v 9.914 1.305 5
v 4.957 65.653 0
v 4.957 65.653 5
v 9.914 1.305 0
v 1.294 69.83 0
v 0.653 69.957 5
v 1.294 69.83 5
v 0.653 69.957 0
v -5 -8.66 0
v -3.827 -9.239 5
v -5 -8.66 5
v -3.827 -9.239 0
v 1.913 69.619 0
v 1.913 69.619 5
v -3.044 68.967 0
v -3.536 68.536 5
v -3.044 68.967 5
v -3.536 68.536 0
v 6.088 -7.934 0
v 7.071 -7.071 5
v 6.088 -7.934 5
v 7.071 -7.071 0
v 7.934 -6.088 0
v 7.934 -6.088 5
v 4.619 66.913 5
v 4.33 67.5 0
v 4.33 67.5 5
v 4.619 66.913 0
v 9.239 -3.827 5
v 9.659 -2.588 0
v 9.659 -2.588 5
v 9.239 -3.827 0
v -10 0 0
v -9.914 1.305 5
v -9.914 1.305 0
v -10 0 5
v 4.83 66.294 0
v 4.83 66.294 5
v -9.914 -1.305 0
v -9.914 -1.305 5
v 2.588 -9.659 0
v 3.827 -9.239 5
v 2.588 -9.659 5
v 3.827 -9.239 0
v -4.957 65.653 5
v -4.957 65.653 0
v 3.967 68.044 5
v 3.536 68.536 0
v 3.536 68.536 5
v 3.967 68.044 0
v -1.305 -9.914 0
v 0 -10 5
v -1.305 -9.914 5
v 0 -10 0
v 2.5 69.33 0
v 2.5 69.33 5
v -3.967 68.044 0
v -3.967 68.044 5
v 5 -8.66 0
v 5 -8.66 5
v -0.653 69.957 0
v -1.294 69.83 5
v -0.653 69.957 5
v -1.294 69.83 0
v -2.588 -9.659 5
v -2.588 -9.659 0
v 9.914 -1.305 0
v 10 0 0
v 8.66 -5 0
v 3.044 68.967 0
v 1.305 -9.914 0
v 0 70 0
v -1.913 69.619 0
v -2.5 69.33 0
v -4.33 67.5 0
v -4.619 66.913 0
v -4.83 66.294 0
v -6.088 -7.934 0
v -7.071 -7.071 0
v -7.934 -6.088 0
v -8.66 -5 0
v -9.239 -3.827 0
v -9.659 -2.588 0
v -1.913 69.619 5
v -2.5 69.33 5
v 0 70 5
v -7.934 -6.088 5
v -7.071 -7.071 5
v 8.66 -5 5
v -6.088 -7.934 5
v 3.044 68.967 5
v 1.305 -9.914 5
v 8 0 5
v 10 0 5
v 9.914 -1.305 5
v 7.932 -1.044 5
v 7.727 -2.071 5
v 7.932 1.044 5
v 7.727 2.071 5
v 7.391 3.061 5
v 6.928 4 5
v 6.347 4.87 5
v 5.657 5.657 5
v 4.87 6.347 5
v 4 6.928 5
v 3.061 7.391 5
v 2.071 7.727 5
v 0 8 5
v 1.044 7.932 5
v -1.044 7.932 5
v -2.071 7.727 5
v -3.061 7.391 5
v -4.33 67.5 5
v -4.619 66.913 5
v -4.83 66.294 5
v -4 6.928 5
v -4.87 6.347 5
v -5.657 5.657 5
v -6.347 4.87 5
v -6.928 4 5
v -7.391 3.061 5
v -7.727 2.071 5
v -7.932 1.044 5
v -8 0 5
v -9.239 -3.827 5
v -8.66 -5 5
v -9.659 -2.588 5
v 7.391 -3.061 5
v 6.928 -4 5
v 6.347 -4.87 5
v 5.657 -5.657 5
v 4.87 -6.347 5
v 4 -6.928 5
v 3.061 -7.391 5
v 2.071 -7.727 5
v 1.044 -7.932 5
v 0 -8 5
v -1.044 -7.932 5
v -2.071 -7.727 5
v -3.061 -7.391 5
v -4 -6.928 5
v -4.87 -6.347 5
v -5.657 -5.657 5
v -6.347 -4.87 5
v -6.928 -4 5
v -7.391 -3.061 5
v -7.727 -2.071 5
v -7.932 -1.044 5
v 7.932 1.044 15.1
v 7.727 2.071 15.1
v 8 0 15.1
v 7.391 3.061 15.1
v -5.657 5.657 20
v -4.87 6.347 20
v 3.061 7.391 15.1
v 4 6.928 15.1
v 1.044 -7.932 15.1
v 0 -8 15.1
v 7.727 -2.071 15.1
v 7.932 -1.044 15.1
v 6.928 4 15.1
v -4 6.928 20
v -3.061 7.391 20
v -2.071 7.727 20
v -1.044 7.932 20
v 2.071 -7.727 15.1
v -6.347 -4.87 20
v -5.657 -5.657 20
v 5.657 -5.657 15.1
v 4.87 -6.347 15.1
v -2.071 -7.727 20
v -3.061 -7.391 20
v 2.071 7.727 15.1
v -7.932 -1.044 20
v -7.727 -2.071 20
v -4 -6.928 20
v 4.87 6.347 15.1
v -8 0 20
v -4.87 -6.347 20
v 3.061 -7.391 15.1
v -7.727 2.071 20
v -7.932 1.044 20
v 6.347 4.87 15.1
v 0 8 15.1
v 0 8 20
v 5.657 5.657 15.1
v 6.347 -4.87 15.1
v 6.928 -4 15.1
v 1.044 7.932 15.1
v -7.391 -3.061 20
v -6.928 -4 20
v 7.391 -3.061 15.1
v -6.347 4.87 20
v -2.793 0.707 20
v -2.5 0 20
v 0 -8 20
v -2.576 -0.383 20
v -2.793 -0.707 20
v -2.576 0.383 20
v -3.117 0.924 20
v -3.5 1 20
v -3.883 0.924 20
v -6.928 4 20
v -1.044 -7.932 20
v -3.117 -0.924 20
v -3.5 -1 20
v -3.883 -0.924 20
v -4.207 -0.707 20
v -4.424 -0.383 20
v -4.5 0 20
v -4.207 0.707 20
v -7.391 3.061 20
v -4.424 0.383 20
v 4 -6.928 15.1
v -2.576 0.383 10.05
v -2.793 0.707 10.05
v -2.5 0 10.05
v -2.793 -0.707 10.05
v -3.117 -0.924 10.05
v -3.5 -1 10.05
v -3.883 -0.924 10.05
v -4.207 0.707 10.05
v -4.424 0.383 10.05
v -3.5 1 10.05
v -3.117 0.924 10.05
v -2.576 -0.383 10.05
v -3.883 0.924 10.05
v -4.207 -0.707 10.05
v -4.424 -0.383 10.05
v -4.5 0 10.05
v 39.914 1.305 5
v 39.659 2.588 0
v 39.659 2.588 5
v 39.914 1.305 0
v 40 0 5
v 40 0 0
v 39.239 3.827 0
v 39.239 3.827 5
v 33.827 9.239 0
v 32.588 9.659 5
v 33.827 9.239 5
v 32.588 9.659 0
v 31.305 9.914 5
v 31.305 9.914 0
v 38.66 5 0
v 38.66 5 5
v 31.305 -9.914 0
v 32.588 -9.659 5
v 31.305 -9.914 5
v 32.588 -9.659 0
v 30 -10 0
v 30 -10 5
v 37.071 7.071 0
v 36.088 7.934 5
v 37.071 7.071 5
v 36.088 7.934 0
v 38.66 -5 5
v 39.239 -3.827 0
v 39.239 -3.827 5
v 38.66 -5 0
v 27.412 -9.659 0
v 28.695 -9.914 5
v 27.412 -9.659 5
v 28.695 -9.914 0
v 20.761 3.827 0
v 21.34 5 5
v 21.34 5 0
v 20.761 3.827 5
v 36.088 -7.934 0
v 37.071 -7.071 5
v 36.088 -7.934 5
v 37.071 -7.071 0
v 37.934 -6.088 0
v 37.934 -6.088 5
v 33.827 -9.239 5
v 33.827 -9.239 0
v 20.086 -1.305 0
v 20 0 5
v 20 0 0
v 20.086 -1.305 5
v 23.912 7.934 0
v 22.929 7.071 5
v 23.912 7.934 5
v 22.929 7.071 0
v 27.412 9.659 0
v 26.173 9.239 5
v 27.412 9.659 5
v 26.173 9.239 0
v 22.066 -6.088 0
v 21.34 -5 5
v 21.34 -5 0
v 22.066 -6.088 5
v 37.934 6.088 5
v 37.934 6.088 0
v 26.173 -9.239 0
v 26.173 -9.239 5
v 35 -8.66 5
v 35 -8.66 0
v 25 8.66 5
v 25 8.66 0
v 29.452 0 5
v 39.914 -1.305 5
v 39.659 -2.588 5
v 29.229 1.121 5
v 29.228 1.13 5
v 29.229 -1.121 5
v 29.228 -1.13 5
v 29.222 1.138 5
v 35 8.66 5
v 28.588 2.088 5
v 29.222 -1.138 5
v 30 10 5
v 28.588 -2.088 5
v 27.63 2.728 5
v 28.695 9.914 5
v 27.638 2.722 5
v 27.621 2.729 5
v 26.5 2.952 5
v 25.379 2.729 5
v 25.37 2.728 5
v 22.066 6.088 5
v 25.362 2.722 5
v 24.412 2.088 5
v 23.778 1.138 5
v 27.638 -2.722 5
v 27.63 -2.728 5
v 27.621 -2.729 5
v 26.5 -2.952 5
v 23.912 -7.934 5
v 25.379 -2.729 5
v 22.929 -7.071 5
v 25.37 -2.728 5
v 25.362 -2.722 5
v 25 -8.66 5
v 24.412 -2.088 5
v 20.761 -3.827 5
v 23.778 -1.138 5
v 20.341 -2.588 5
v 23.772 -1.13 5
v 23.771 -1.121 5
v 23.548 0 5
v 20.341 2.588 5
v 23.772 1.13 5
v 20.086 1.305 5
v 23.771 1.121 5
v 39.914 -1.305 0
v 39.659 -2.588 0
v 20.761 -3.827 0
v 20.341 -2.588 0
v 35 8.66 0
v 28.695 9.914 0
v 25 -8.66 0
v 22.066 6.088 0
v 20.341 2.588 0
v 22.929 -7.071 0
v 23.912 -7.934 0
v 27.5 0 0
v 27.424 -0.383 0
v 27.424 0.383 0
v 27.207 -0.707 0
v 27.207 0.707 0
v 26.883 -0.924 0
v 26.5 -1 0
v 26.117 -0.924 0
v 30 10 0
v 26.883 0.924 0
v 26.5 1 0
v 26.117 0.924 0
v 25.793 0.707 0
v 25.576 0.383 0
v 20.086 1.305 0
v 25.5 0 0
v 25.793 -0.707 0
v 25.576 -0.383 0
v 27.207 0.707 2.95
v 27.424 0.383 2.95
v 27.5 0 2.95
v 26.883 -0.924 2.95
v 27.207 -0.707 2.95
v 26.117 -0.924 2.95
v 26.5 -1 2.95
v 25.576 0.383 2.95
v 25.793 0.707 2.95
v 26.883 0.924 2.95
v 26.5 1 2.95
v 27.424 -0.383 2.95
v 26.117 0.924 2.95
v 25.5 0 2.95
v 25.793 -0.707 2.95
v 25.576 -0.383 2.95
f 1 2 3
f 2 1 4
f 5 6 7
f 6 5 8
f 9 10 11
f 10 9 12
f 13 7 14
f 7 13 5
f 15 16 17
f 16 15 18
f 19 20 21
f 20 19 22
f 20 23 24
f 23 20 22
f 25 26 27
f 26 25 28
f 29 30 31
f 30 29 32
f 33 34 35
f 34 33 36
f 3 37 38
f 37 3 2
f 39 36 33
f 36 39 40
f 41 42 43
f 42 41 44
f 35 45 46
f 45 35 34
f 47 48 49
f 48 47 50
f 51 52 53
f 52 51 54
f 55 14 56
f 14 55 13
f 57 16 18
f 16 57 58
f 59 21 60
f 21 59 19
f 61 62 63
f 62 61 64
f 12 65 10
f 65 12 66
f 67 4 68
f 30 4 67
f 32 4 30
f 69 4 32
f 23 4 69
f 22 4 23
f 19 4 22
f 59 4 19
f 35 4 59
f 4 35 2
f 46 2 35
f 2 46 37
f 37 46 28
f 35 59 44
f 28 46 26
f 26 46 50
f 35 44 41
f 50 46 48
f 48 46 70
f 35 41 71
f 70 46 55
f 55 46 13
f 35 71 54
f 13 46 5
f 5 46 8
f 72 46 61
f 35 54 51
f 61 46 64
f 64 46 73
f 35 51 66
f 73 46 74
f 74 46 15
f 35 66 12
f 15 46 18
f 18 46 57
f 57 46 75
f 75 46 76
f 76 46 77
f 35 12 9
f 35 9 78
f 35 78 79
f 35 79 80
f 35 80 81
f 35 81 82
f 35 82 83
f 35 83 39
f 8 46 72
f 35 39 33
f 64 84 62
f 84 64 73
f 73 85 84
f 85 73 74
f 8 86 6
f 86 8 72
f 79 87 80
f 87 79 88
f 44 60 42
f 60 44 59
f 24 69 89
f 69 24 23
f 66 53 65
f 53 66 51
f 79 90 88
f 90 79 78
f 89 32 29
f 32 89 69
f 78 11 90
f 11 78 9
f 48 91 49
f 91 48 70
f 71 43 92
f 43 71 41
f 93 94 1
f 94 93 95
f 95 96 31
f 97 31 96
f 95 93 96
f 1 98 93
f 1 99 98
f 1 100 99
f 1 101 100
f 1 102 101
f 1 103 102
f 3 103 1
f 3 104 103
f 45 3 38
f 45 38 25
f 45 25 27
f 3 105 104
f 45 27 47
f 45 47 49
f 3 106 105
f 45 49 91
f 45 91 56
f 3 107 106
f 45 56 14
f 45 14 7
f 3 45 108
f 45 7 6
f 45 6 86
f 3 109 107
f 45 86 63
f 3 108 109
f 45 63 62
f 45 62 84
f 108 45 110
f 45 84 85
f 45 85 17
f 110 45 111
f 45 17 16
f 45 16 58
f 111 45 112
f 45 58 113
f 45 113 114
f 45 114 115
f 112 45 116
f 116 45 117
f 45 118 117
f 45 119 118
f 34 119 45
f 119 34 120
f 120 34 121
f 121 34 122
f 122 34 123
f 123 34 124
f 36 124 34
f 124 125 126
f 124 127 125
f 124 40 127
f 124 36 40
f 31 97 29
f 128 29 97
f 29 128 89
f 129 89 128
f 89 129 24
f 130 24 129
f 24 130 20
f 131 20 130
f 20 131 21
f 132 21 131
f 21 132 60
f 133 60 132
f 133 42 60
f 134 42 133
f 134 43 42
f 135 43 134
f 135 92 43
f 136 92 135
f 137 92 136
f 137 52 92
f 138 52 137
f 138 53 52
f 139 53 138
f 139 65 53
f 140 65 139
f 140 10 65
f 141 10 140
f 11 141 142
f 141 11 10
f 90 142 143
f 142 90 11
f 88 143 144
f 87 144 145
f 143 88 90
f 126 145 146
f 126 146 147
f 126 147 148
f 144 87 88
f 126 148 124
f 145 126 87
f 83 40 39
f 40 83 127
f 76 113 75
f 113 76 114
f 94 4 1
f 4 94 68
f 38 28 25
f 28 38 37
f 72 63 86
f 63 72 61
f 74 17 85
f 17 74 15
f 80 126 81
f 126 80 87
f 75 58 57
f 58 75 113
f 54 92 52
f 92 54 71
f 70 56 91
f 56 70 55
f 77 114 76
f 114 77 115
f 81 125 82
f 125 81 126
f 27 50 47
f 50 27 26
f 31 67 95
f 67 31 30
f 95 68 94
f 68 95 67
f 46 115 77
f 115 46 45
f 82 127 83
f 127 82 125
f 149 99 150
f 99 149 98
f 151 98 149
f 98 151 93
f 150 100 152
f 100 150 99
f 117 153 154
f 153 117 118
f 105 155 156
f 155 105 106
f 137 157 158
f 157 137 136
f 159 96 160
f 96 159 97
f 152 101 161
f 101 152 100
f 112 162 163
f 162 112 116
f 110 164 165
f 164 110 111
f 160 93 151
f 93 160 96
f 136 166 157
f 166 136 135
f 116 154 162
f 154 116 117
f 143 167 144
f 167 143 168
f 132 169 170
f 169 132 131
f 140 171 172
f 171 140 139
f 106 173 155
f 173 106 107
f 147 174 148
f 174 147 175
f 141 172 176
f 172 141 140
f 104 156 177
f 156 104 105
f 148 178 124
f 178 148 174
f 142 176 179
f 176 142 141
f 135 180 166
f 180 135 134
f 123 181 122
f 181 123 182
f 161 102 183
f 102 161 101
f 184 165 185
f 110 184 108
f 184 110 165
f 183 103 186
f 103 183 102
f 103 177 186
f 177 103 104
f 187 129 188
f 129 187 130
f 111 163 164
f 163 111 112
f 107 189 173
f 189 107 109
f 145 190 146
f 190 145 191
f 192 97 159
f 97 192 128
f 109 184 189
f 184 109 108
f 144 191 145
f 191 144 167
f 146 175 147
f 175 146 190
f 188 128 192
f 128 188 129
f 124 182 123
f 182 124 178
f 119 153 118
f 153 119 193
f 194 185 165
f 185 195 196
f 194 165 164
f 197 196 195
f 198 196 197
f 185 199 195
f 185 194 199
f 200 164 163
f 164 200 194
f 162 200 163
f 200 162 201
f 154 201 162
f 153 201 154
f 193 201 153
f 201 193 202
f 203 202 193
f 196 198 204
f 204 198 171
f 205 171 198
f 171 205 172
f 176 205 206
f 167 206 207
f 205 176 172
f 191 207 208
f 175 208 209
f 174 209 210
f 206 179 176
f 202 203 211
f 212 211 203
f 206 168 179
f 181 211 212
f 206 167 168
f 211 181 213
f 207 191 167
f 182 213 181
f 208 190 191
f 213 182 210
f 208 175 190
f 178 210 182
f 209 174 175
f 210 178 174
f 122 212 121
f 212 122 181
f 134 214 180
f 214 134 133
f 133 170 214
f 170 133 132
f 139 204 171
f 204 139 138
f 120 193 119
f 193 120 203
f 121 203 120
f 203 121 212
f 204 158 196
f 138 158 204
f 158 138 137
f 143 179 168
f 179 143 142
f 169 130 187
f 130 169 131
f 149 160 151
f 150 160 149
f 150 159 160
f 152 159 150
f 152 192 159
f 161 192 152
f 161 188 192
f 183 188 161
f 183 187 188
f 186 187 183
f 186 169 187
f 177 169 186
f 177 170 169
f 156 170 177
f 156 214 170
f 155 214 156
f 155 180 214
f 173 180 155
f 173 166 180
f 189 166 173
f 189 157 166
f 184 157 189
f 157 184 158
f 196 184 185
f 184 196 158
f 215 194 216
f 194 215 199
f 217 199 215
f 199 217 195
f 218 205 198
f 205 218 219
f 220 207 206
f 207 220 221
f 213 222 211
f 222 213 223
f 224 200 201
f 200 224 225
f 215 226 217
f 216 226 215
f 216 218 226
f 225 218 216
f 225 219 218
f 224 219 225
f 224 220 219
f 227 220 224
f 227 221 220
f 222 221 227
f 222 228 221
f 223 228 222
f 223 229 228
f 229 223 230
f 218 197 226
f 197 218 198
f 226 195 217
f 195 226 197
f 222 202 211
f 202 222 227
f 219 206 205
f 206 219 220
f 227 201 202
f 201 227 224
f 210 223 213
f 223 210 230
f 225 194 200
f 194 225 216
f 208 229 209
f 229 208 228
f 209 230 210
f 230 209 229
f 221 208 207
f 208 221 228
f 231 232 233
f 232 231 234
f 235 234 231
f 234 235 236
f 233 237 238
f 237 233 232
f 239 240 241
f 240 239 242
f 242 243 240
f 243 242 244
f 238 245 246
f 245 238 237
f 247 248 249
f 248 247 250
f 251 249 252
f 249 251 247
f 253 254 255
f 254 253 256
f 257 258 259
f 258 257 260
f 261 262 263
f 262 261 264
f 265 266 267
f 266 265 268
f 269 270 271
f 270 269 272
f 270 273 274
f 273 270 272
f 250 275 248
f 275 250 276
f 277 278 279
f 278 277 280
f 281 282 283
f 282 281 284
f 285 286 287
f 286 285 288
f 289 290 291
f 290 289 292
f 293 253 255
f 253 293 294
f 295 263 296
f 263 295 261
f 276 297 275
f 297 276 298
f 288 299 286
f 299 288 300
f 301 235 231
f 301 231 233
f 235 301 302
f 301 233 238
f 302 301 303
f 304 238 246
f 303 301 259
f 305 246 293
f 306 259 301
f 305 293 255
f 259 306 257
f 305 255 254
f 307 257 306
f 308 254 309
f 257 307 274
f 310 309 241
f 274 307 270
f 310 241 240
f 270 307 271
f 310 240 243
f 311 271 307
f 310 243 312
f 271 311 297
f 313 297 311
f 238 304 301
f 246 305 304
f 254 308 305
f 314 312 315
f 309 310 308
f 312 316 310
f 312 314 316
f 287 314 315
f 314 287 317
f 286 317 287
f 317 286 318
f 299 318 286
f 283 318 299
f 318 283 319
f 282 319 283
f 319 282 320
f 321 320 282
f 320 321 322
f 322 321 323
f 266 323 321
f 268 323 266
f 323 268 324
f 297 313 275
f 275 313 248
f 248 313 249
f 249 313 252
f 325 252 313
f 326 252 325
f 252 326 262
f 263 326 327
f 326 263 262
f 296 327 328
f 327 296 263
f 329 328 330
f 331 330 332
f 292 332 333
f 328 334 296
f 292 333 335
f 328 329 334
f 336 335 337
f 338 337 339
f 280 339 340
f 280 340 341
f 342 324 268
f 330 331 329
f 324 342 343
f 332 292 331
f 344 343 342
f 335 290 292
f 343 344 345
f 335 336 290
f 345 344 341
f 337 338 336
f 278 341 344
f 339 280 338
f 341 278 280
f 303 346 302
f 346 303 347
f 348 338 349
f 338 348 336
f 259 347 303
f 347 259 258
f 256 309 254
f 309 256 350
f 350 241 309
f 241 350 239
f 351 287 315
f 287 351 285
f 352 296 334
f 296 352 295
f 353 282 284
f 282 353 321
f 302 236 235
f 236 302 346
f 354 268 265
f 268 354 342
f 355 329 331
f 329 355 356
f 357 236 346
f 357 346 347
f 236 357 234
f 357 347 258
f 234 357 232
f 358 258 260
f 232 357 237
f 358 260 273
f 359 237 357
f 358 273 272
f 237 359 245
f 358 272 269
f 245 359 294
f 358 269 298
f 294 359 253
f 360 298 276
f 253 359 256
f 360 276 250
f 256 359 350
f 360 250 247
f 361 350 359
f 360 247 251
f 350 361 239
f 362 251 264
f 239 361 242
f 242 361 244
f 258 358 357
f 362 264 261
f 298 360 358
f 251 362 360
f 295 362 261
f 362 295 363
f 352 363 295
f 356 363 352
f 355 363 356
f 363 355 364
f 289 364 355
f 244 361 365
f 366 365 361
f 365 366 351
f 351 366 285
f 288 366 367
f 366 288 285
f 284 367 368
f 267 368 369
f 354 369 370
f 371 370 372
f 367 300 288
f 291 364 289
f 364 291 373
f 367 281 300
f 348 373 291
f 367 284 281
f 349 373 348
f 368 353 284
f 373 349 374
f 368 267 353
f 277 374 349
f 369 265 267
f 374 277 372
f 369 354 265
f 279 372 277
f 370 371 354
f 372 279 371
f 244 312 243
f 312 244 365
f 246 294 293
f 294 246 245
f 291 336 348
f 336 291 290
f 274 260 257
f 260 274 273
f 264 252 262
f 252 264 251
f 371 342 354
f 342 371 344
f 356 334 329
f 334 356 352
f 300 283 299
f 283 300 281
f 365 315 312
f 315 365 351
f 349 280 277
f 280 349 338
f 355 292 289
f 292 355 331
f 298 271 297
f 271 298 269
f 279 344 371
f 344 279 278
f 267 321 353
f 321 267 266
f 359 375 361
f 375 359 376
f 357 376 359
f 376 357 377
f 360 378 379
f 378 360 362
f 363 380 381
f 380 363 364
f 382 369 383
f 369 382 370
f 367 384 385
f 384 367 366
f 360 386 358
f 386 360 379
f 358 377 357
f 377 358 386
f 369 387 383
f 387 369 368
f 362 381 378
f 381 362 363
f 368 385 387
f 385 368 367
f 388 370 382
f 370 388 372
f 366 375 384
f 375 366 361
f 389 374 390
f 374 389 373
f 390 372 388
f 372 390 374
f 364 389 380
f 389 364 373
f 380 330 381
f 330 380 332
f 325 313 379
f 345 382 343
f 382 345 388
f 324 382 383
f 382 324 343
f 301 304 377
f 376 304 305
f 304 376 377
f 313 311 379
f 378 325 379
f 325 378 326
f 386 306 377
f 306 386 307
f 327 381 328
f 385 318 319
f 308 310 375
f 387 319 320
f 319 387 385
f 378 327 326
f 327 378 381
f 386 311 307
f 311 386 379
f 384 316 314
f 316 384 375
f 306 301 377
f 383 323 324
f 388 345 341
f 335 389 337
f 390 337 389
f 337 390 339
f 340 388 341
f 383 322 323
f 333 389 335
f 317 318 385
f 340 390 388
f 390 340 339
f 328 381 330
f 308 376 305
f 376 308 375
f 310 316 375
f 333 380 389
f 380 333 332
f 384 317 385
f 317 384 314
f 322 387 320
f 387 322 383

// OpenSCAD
// file: Defines_v1.scad
/* spacing between the leds
 * usually around 12, can be forced
 * to 6-10 by bending strip
 */
space = 6;  

/* some space for the outermost leds
 * for better viewing angle
 */
margin = 10;

/* 15 leds (type 5050) with above spacing */
width = 15 * (5 + space) + 10 + 2 * margin;

/* box height, min. 42mm */
height = 47;

/* box depth, min 100mm for 4x3-keypad */
depth = 105;

/* max wall thickness */
thick=10;

/* grade of feet smoothness
 * below 10 looks bad
 * 10-16 is reasonable
 * above 16 takes much time to render
 */
grade = 12;

/* length of side stands 
 * should be enough to get box in right angle
 * should not exceed back of box
 */
stand = min(height + 20, depth - 40);

/* offset of usb plug from center */
usb_offs = 60;

/* calculated values */
bwidth = width + 14;
bheight = depth + 7;

/* size of led holes 
 * includes some margin for 5050 leds
 */
led = 5.75;

minimal = 1;
// main file
include <Defines_v1.scad>;

module Stativ() {
    difference() {
        union() {
            hull() {
                translate([0, stand, 0]) cylinder(5, 5, 5, $fn=48);
                cylinder(5, 10, 10, $fn=48);
            }
            cylinder(20, 8, 8, $fn=48);
        }
        translate([0, -10, 15.1]) cube([20, 20, 5]);
        translate([-3.5, 0, 15.1]) 
            cylinder(10.1, 1, 1, $fn=16, center = true);
    }
}

module Scheibe() {
    difference() {
        cylinder(5, 10, 10, $fn=48);
        translate([-3.5, 0, 0.1]) 
            cylinder(10.1, 1, 1, $fn=16, center = true);
        translate([-3.5, 0, 4]) 
            cylinder(2.1, 1, 3, $fn=16, center = true);        
    }
}

Stativ();
translate([30,0,0]) Scheibe();
